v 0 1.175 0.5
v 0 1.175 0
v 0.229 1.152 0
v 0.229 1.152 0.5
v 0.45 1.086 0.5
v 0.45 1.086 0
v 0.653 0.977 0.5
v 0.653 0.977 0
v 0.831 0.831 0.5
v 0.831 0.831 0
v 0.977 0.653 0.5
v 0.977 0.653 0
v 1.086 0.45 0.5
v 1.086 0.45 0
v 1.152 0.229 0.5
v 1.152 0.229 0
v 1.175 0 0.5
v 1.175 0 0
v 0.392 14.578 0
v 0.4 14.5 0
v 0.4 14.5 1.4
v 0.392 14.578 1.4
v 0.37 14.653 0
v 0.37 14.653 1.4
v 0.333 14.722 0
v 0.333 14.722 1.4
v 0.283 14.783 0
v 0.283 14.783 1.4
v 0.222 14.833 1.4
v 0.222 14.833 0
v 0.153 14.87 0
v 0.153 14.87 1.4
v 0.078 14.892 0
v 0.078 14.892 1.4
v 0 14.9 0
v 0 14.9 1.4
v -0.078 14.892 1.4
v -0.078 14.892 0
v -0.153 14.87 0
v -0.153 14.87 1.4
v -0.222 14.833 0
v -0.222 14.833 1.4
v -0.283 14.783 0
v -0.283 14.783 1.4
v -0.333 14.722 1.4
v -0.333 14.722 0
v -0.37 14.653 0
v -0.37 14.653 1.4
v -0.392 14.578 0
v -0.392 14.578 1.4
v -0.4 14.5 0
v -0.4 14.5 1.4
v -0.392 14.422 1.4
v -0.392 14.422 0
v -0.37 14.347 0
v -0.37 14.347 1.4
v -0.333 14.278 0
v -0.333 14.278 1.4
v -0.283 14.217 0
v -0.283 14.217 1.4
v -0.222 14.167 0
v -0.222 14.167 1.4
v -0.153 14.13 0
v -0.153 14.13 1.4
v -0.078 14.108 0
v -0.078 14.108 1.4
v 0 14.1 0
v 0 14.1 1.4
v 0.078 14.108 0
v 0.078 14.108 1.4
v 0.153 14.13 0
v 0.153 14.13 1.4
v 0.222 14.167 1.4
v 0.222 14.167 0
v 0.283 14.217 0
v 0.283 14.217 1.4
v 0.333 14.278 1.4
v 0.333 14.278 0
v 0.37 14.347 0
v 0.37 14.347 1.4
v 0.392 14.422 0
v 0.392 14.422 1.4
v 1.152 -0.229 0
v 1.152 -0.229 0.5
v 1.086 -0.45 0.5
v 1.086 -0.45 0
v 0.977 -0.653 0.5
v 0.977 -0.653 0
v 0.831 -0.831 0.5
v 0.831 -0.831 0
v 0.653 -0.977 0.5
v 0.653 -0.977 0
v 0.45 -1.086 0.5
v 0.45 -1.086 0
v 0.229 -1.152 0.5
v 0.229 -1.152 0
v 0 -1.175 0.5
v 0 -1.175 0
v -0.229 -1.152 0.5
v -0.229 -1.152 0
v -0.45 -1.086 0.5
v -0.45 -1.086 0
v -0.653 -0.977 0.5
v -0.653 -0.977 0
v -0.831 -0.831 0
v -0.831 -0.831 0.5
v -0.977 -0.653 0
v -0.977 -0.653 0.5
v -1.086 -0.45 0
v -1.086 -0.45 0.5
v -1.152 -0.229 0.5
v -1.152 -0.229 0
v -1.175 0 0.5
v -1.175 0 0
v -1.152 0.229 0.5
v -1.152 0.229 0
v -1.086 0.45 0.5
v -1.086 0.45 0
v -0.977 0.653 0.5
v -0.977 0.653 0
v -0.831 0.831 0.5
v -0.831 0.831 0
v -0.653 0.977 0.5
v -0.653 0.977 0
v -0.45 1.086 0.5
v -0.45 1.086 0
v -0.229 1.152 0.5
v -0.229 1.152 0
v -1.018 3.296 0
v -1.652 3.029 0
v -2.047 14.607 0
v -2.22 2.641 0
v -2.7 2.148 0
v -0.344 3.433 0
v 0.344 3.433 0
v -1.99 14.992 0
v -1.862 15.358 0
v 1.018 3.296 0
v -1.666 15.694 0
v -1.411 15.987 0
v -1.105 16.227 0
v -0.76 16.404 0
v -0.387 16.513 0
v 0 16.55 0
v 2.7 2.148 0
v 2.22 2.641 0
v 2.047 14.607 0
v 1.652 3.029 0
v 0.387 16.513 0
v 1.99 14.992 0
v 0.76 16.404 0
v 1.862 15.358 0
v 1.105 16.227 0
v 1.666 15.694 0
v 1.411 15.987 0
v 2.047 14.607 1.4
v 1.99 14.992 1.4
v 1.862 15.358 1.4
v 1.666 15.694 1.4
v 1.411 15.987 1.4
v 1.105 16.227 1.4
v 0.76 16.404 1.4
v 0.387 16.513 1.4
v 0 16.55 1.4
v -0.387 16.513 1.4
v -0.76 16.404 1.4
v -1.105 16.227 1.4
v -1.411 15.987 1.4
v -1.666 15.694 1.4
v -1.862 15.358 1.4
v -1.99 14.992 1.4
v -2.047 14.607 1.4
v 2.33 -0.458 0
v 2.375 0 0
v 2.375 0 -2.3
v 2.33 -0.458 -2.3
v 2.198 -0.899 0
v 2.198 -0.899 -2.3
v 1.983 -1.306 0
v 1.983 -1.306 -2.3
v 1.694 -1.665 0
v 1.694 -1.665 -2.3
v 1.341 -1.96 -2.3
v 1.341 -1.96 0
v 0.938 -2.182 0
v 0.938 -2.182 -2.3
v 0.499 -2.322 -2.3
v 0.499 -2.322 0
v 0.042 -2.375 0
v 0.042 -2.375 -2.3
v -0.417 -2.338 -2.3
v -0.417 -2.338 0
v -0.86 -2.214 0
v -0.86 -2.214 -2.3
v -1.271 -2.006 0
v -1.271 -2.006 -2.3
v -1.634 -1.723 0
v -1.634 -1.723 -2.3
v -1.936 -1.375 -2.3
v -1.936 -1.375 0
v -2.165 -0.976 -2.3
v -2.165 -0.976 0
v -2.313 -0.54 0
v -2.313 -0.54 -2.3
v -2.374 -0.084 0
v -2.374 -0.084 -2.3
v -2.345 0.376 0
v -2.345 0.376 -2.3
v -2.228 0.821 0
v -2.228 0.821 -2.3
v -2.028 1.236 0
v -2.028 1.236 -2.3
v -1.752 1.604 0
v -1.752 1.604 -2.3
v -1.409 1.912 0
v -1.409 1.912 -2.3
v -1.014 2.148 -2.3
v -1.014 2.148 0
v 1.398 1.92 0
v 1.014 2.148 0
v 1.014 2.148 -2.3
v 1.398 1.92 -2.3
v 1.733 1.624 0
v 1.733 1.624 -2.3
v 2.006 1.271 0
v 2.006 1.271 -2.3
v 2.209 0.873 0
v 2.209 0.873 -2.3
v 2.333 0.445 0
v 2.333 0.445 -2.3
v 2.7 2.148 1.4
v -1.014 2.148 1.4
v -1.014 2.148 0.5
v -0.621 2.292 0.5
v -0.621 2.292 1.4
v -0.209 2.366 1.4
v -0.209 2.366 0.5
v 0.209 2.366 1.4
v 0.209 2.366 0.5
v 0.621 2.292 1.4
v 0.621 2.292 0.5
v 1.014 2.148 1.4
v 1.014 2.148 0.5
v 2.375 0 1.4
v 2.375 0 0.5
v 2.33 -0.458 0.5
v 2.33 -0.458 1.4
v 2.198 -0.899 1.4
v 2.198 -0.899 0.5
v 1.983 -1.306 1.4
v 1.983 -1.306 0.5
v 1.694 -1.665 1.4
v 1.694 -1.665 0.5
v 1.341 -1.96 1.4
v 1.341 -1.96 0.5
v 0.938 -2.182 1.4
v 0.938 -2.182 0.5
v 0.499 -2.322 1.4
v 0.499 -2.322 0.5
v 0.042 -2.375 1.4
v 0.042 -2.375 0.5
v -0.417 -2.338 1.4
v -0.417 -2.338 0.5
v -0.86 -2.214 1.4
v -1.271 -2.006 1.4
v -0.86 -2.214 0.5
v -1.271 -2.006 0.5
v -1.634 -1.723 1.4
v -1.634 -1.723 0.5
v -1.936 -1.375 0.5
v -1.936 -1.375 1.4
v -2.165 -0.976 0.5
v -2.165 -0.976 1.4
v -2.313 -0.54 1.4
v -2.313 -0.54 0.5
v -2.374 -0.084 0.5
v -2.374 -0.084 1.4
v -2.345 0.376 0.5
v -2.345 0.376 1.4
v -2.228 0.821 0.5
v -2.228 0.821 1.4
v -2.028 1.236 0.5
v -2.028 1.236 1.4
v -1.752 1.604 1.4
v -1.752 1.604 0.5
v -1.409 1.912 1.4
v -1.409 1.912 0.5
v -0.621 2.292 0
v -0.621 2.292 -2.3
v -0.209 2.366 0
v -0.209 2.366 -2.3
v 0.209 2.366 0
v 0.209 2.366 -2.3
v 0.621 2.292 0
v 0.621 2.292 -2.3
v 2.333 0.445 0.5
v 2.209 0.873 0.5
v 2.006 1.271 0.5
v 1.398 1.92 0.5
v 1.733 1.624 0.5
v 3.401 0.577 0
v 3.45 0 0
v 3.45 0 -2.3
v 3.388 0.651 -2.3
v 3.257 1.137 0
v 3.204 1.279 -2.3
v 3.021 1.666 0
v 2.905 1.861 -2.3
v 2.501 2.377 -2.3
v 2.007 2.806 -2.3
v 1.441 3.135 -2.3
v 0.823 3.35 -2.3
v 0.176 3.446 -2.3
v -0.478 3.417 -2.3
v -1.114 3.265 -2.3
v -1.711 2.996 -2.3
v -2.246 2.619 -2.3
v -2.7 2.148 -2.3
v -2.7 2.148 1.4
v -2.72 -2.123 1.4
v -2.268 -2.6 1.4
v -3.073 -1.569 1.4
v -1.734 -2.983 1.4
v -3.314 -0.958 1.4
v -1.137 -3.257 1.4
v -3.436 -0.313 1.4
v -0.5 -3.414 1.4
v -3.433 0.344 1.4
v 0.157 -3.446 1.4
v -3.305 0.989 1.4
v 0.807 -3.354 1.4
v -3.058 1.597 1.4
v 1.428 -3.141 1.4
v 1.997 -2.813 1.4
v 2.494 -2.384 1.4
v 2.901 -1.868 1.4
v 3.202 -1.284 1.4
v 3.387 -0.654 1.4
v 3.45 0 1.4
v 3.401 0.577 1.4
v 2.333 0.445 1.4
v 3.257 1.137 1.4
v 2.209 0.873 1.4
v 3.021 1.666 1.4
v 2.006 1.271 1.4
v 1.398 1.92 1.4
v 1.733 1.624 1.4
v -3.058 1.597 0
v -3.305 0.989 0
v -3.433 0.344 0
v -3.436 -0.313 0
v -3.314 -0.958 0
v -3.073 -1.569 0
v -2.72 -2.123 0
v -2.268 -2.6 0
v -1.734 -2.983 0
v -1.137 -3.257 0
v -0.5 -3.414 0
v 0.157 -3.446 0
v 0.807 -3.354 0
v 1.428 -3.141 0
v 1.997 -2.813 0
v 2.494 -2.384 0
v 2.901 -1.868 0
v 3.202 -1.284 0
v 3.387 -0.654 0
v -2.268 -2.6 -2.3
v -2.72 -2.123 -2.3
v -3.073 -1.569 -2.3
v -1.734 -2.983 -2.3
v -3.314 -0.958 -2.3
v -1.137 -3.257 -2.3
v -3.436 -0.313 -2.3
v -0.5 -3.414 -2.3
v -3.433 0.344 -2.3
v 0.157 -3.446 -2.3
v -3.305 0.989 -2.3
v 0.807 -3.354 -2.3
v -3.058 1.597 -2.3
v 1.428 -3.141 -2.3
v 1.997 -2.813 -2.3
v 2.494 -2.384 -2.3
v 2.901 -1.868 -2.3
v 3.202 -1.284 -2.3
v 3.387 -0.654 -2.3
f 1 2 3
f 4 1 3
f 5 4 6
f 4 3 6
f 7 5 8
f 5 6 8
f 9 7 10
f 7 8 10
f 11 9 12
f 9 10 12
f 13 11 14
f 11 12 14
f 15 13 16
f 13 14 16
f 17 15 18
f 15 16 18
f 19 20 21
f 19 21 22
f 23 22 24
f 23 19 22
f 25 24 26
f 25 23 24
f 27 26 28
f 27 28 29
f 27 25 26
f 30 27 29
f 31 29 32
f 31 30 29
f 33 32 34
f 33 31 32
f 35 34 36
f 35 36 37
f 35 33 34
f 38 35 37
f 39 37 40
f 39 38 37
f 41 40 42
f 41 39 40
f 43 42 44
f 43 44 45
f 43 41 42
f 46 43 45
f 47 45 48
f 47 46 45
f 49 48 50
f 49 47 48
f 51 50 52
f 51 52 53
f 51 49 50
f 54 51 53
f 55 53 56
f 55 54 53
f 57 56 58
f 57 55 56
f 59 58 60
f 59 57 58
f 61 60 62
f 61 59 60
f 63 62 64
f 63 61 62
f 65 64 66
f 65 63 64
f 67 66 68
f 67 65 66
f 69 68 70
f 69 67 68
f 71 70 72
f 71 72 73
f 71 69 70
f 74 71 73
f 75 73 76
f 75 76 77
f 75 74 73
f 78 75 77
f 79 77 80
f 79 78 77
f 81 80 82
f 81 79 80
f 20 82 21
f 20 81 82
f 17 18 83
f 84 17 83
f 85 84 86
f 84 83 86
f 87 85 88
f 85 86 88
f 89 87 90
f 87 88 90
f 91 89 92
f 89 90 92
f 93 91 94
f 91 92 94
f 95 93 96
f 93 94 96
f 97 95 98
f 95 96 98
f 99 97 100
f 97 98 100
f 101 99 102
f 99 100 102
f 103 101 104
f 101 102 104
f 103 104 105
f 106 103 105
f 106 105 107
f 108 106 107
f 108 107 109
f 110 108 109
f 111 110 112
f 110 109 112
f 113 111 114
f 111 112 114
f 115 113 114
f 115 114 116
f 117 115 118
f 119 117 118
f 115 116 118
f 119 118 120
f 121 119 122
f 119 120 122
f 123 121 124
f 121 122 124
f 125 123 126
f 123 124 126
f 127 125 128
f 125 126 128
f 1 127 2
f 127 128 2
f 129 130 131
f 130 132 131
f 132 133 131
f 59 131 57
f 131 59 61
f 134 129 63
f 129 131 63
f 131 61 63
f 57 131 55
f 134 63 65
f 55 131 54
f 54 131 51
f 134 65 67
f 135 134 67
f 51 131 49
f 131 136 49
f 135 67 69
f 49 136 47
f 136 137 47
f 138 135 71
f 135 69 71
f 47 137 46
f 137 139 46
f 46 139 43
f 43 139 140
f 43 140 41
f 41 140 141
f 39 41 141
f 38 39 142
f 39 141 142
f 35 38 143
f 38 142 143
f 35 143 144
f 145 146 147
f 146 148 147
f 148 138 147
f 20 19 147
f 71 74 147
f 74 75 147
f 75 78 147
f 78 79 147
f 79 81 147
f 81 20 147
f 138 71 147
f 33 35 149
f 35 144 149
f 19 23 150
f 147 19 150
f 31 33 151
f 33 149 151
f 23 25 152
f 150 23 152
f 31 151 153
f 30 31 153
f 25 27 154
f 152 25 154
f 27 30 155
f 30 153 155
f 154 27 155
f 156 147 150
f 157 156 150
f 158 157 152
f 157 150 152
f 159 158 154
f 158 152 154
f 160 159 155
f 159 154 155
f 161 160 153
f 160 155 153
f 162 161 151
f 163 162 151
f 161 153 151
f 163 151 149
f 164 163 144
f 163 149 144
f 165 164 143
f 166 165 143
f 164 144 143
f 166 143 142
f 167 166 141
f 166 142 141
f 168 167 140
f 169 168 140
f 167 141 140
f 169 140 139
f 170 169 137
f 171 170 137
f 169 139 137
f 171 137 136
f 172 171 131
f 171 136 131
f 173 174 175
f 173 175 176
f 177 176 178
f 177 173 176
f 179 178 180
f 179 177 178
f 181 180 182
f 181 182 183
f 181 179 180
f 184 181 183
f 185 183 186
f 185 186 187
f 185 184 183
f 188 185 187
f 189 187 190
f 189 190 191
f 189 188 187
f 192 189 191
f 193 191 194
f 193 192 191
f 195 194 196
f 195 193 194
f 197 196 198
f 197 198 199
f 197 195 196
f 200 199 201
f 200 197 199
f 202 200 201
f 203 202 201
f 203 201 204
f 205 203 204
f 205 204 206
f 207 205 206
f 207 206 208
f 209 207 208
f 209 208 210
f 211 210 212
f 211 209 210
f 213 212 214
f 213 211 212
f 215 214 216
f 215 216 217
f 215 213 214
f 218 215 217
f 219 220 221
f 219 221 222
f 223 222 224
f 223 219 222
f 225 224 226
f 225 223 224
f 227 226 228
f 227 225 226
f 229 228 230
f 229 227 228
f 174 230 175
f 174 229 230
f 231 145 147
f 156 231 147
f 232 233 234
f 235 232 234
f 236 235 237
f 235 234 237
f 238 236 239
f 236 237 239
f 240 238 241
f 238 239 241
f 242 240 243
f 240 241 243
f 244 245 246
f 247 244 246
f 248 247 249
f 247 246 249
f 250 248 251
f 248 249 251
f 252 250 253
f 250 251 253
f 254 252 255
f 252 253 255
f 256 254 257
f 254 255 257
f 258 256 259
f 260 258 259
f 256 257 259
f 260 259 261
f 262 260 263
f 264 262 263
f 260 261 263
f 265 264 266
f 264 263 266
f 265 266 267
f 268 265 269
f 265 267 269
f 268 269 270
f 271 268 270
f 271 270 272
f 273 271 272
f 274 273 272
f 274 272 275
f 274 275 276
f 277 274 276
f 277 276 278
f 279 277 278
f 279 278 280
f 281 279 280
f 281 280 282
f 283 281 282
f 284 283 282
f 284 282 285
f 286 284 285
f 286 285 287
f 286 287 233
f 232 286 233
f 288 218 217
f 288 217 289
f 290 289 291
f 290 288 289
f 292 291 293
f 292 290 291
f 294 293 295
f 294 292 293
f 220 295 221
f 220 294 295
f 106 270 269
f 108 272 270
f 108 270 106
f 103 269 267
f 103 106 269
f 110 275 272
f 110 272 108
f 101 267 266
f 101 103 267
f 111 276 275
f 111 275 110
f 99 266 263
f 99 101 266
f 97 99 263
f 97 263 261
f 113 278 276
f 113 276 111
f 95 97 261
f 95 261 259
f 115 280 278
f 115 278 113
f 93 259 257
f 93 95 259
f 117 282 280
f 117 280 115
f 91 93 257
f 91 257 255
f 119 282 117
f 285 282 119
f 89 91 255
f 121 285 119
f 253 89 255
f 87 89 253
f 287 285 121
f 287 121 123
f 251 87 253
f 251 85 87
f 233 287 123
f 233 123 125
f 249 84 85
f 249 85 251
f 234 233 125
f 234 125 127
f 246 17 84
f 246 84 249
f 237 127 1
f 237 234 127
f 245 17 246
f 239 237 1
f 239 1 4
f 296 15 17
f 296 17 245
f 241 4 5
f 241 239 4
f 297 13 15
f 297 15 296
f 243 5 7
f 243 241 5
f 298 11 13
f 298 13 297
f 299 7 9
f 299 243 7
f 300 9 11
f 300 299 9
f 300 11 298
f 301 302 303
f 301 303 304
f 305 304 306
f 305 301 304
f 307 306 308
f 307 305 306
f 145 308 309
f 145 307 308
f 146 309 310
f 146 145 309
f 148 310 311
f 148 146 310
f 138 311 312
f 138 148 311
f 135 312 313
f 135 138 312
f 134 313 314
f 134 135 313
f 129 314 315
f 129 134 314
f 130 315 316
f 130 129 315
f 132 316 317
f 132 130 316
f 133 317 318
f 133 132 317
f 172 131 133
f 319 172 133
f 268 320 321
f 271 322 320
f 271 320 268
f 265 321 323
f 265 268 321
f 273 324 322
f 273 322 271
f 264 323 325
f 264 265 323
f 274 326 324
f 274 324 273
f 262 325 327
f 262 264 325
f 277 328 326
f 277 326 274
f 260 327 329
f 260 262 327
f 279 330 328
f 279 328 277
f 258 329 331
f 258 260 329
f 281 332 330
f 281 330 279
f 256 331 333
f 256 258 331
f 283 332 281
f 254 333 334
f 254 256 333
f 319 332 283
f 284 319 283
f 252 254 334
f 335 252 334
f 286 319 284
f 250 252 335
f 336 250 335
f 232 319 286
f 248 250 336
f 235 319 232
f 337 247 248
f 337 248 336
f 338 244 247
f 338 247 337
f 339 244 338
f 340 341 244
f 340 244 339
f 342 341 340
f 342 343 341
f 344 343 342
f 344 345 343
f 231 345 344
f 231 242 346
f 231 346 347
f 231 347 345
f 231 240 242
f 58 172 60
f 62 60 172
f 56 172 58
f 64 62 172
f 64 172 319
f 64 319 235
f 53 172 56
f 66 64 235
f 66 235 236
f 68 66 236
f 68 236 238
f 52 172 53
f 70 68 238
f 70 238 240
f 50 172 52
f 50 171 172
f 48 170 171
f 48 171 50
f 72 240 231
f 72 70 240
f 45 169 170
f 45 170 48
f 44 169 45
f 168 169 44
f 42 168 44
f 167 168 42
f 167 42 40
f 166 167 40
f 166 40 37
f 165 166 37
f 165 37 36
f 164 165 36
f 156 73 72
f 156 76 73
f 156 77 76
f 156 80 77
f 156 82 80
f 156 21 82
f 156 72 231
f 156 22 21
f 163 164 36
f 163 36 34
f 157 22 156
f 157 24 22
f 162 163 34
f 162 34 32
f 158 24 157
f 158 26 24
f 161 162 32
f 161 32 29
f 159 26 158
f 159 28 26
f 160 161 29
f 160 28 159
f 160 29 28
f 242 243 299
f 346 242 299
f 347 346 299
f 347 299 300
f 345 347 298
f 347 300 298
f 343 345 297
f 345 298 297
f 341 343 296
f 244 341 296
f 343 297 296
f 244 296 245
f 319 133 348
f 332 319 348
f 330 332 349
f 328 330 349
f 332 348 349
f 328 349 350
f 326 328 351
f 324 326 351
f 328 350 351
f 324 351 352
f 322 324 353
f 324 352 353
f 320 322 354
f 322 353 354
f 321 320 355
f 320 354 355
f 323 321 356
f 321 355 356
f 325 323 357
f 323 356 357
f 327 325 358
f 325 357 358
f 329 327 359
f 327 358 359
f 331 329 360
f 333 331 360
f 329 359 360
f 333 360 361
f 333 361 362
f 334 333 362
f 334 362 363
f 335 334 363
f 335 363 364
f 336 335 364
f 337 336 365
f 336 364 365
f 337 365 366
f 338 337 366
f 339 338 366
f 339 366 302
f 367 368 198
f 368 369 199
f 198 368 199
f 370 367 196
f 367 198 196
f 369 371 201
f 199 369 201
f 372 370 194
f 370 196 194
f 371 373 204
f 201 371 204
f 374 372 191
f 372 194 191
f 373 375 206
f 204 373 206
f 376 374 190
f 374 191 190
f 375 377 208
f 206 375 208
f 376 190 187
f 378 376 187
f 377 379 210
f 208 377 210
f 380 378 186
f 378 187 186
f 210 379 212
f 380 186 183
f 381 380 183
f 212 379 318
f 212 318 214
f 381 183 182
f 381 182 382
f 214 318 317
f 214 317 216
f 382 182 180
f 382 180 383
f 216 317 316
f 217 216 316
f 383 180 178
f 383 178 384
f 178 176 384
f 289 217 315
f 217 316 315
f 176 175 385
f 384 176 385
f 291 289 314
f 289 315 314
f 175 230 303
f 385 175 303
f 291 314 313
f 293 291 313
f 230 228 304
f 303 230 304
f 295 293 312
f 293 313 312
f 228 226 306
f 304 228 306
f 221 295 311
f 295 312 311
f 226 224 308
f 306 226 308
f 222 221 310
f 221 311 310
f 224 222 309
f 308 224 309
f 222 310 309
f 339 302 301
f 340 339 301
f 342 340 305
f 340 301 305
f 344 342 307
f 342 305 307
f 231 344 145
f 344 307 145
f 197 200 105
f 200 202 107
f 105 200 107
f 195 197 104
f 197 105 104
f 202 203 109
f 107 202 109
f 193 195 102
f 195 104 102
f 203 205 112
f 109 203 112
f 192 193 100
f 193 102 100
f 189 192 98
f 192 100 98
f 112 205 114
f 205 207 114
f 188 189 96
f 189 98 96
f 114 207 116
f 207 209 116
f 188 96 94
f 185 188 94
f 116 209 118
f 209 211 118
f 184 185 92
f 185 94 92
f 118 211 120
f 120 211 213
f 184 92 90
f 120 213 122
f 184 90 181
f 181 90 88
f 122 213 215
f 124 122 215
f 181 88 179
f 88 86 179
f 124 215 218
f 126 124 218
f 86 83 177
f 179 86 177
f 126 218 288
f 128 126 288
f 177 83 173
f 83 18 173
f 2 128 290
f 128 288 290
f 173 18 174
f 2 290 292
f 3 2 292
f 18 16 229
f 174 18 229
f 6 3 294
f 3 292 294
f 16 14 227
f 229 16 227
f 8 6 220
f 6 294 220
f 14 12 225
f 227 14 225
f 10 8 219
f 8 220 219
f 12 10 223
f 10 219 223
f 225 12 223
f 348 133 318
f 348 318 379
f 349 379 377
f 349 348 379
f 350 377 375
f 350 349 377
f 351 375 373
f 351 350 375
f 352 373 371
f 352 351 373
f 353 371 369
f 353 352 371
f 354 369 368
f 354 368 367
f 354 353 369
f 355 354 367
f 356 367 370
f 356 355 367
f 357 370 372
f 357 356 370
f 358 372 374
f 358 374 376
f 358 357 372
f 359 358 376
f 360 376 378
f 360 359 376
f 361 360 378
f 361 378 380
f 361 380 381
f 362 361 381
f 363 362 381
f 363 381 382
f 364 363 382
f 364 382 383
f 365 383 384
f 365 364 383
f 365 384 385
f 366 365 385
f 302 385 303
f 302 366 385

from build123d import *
from build123d import SkipClean  # not in build123d's __all__

# Parameters (mm, degrees)
F0_R     = 0.4
F1_DEPTH = 1.4
F2_DEPTH = 2.3
F3_DEPTH = 0.5


with BuildPart() as f1:
    # F0 (on Top) → F1 (new body)
    with BuildSketch(Plane.XY):
        with BuildLine():
            ThreePointArc((-2.7, 2.1476731595), (-1.1374313166, -3.2571076126), (3.45, 0))
            ThreePointArc((3.45, 0), (3.2571076126, 1.1374313166), (2.7, 2.1476731595))
            Line((2.7, 2.1476731595), (1.0139649895, 2.1476731595))
            ThreePointArc((1.0139649895, 2.1476731595), (2.0060897101, 1.2713099838), (2.375, 0))
            ThreePointArc((2.375, 0), (-1.2713099838, -2.0060897101), (-1.0139649895, 2.1476731595))
            Line((-1.0139649895, 2.1476731595), (-2.7, 2.1476731595))
        make_face()
        with BuildLine():
            Line((1.0139649895, 2.1476731595), (2.7, 2.1476731595))
            ThreePointArc((2.7, 2.1476731595), (0, 3.45), (-2.7, 2.1476731595))
            Line((-2.7, 2.1476731595), (-1.0139649895, 2.1476731595))
            ThreePointArc((-1.0139649895, 2.1476731595), (0, 2.375), (1.0139649895, 2.1476731595))
        make_face()
        with BuildLine():
            ThreePointArc((-2.7, 2.1476731595), (0, 3.45), (2.7, 2.1476731595))
            Line((2.7, 2.1476731595), (2.0471920173, 14.6072606371))
            ThreePointArc((2.0471920173, 14.6072606371), (2.0492978841, 14.553648693), (2.05, 14.5))
            ThreePointArc((2.05, 14.5), (-0.053648693, 12.4507021159), (-2.0471920173, 14.6072606371))
            Line((-2.0471920173, 14.6072606371), (-2.7, 2.1476731595))
        make_face()
        with BuildLine():
            ThreePointArc((2.05, 14.5), (2.0492978841, 14.553648693), (2.0471920173, 14.6072606371))
            ThreePointArc((2.0471920173, 14.6072606371), (0, 16.55), (-2.0471920173, 14.6072606371))
            ThreePointArc((-2.0471920173, 14.6072606371), (-0.053648693, 12.4507021159), (2.05, 14.5))
        make_face()
        with Locations((0, 14.5)):
            Circle(F0_R, mode=Mode.SUBTRACT)
    extrude(amount=F1_DEPTH)

    # F0 (on Top) → F2 (join)
    with BuildSketch(Plane.XY):
        with BuildLine():
            Line((1.0139649895, 2.1476731595), (2.7, 2.1476731595))
            ThreePointArc((2.7, 2.1476731595), (0, 3.45), (-2.7, 2.1476731595))
            Line((-2.7, 2.1476731595), (-1.0139649895, 2.1476731595))
            ThreePointArc((-1.0139649895, 2.1476731595), (0, 2.375), (1.0139649895, 2.1476731595))
        make_face()
        with BuildLine():
            ThreePointArc((-2.7, 2.1476731595), (-1.1374313166, -3.2571076126), (3.45, 0))
            ThreePointArc((3.45, 0), (3.2571076126, 1.1374313166), (2.7, 2.1476731595))
            Line((2.7, 2.1476731595), (1.0139649895, 2.1476731595))
            ThreePointArc((1.0139649895, 2.1476731595), (2.0060897101, 1.2713099838), (2.375, 0))
            ThreePointArc((2.375, 0), (-1.2713099838, -2.0060897101), (-1.0139649895, 2.1476731595))
            Line((-1.0139649895, 2.1476731595), (-2.7, 2.1476731595))
        make_face()
    with SkipClean():  # cleaning this boolean's faces spoils the solid; the shape is the same uncleaned
        extrude(amount=-F2_DEPTH)

    # F0 (on Top) → F3 (join)
    with BuildSketch(Plane.XY):
        with BuildLine():
            Line((0, 2.1476731595), (1.0139649895, 2.1476731595))
            ThreePointArc((1.0139649895, 2.1476731595), (0, 2.375), (-1.0139649895, 2.1476731595))
            Line((-1.0139649895, 2.1476731595), (0, 2.1476731595))
        make_face()
        with BuildLine():
            ThreePointArc((2.375, 0), (2.0060897101, 1.2713099838), (1.0139649895, 2.1476731595))
            Line((1.0139649895, 2.1476731595), (0, 2.1476731595))
            Line((0, 2.1476731595), (-1.0139649895, 2.1476731595))
            ThreePointArc((-1.0139649895, 2.1476731595), (-1.2713099838, -2.0060897101), (2.375, 0))
        make_face()
        with BuildLine():
            ThreePointArc((1.175, 0), (-0.8308504679, -0.8308504679), (0, 1.175))
            ThreePointArc((0, 1.175), (0.8308504679, 0.8308504679), (1.175, 0))
        make_face(mode=Mode.SUBTRACT)
    extrude(amount=F3_DEPTH)


solid = f1.part
